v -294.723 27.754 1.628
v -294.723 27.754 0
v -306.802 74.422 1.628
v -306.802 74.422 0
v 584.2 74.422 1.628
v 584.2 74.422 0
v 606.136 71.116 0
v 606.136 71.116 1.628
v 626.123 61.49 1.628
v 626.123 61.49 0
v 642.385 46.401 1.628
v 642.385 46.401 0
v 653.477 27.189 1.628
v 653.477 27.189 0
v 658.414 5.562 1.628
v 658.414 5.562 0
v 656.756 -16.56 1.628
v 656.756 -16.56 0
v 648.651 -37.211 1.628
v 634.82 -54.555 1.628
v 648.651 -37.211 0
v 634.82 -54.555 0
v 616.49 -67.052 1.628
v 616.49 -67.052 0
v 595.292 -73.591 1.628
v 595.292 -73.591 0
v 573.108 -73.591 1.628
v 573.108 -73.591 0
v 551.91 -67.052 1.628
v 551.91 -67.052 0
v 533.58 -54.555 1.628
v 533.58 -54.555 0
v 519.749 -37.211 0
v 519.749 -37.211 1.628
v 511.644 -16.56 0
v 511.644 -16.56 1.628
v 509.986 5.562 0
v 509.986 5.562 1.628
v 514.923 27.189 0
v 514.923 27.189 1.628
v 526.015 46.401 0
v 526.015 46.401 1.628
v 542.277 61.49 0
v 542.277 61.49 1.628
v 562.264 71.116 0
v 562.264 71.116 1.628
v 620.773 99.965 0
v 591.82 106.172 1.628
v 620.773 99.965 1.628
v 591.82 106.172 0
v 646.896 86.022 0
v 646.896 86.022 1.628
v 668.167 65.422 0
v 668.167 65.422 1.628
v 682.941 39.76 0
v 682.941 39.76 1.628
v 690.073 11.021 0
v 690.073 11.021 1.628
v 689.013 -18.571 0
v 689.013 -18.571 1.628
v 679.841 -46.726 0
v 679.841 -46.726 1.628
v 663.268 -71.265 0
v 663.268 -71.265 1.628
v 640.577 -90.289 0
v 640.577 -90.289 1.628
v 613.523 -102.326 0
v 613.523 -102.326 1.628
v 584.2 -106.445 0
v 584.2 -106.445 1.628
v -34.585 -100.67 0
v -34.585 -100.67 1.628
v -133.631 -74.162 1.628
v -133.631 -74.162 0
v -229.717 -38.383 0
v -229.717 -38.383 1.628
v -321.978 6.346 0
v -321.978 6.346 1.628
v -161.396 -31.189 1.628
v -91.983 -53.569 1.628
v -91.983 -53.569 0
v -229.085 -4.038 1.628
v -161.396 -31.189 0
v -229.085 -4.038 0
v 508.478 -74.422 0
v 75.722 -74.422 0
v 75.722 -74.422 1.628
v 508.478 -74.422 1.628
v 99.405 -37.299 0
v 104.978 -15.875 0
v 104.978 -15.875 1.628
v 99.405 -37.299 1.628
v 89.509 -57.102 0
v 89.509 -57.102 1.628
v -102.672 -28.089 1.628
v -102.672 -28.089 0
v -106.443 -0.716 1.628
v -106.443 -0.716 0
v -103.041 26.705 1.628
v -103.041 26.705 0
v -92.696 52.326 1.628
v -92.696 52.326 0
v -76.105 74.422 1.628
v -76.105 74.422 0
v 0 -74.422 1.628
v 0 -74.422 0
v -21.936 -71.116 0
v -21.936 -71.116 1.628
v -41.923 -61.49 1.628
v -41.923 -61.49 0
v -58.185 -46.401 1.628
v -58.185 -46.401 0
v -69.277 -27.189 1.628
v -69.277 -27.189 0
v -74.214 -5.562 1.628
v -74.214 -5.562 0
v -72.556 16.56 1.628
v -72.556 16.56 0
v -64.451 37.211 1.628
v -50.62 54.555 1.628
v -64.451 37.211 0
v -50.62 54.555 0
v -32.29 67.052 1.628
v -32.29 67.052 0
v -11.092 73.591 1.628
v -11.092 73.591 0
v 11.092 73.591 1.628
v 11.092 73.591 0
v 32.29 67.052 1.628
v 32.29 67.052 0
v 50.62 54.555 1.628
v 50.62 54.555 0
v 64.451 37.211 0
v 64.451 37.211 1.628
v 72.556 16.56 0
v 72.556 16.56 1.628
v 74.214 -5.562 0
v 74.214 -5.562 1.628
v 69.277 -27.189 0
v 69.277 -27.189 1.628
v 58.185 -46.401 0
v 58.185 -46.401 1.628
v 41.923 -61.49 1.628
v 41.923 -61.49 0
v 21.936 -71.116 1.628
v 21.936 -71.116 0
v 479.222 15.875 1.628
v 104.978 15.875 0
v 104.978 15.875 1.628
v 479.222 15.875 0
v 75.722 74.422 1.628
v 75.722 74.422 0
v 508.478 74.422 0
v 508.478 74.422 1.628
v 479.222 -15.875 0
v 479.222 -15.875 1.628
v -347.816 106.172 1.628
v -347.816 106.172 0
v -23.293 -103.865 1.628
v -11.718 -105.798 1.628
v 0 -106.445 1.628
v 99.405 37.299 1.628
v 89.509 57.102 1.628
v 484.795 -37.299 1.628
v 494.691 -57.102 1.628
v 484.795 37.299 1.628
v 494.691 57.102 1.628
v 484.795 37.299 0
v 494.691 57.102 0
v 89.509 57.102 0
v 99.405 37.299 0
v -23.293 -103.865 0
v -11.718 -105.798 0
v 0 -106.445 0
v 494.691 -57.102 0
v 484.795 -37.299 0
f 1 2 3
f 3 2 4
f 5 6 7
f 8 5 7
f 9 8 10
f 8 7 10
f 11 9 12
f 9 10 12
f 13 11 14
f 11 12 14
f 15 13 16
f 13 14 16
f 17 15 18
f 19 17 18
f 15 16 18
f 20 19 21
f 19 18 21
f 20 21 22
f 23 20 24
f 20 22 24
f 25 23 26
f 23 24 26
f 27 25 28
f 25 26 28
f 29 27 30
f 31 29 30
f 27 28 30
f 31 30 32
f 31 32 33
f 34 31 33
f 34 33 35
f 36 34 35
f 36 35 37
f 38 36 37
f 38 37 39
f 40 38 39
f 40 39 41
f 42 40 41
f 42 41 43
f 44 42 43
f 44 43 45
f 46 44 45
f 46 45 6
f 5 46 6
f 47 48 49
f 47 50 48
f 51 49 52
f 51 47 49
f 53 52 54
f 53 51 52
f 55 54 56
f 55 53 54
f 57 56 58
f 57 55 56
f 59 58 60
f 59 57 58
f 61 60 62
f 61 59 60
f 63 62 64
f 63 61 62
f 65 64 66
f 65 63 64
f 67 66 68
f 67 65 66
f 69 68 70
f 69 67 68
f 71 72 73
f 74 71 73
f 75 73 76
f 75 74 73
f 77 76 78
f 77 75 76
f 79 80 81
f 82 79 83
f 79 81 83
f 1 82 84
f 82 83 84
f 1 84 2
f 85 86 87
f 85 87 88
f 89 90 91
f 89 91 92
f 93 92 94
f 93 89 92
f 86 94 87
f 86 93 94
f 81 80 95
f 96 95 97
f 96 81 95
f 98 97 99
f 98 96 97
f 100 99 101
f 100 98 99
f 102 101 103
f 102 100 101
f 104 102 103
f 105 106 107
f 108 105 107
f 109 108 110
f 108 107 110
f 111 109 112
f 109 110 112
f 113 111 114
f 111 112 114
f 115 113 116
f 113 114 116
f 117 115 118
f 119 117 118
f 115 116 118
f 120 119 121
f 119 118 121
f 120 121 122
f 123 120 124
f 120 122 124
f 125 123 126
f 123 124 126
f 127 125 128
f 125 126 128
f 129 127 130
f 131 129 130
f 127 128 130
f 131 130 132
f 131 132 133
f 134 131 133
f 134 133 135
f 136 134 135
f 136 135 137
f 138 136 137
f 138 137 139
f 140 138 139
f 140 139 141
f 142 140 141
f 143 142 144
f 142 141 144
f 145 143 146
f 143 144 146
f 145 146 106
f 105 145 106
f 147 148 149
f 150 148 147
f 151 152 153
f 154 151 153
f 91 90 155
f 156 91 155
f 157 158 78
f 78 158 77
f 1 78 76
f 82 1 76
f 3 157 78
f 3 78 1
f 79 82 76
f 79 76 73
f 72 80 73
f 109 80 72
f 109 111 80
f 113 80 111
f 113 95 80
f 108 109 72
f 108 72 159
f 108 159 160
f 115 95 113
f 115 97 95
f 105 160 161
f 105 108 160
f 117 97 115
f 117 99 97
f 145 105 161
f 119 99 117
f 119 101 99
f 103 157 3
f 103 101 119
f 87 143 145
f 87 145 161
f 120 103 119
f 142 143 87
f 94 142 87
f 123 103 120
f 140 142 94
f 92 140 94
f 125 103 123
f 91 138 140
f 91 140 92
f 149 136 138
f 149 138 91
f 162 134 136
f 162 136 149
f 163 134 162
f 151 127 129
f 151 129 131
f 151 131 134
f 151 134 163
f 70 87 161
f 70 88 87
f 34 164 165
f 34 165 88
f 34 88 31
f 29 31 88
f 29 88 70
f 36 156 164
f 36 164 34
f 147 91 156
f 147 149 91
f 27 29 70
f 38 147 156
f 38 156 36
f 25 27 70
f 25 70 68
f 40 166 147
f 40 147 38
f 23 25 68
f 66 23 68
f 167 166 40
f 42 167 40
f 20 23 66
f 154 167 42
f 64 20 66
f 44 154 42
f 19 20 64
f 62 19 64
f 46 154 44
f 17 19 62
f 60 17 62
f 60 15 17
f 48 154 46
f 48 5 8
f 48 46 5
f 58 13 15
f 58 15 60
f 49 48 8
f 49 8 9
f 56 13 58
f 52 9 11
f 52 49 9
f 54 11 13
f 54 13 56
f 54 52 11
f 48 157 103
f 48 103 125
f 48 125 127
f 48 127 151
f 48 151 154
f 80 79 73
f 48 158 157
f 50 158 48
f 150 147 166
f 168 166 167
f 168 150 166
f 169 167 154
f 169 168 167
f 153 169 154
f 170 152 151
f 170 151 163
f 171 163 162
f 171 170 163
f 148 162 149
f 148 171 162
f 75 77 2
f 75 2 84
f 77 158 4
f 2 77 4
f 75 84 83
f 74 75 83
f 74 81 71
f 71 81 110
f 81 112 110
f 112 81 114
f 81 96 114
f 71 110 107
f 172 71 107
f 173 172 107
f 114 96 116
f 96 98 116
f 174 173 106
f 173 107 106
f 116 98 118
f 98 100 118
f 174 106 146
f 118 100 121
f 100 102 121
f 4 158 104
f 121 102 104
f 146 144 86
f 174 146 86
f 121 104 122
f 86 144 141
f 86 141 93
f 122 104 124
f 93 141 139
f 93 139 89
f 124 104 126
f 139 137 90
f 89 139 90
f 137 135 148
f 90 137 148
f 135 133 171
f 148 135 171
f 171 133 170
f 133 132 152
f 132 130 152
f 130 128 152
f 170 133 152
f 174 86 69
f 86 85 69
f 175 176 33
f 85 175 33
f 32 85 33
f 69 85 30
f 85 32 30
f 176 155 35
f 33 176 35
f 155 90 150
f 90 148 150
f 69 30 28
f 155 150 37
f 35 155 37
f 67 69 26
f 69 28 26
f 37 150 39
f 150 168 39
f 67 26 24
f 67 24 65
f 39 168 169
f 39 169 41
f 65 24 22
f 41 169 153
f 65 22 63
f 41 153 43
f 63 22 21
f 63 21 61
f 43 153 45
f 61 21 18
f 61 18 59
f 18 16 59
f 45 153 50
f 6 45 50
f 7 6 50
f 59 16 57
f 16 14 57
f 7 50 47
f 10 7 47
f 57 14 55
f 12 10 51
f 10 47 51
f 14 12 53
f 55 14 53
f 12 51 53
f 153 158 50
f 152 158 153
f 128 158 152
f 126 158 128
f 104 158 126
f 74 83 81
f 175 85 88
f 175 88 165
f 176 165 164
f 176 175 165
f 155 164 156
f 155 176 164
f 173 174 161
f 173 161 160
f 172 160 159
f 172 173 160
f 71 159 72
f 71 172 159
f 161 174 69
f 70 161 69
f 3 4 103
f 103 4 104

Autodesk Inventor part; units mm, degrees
ref_plane "YZ Plane" through (0, 0, 0) normal (1, 0, 0) x (0, 1, 0)
ref_plane "XZ Plane" through (0, 0, 0) normal (0, 1, 0) x (-1, 0, 0)
ref_plane "XY Plane" through (0, 0, 0) normal (0, 0, 1) x (1, 0, 0)
sketch "Fender Base" plane through (0, 0, 0) normal (0, 0, 1) x (1, 0, 0)
  line L0 (-7.62, 106.172) -> (7.62, 106.172) construction
  line L1 (111.252, 7.62) -> (111.252, -7.62)
  line L2 (576.58, 106.172) -> (591.82, 106.172) construction
  line L3 (692.912, 7.62) -> (692.912, -7.62) construction
  line L4 (-7.62, 106.172) -> (591.82, 106.172)
  arc A0 (528.4894, 74.422) -> (584.2, 92.964) centre (584.2, 0) ccw construction
  circle A1 centre (0, 0) radius 92.964 construction
  arc A2 (584.2, -106.4451) -> (591.82, 106.172) centre (584.2, 0) ccw
  line L5 (584.2, 0) -> (584.2, -74.422) construction
  line L6 (0, 0) -> (0, -106.4451) construction
  line L7 (0, -106.4451) -> (584.2, -106.4451)
  line L8 (0, 92.964) -> (584.2, 92.964) construction
  line L9 (0, -92.964) -> (584.2, -92.964) construction
  line L10 (75.7223, 74.422) -> (508.4777, 74.422)
  line L11 (0, 0) -> (584.2, 0) construction
  line L12 (75.7223, -74.422) -> (508.4777, -74.422)
  arc A3 (0, -74.422) -> (0, 74.422) centre (0, 0) ccw
  arc A4 (509.778, 0) -> (584.2, -74.422) centre (584.2, 0) ccw
  arc A5 (0, 74.422) -> (0, -74.422) centre (0, 0) ccw
  line L13 (584.2, -74.422) -> (584.2, -106.4451) construction
  arc A6 (584.2, 74.422) -> (509.778, 0) centre (584.2, 0) ccw
  arc A7 (584.2, -74.422) -> (584.2, 74.422) centre (584.2, 0) ccw
  arc A8 (479.2215, -15.875) -> (508.4777, -74.422) centre (584.2, 0) ccw
  arc A9 (508.4777, 74.422) -> (479.2215, 15.875) centre (584.2, 0) ccw
  arc A10 (584.2, 92.964) -> (528.4894, 74.422) centre (584.2, 0) ccw construction
  line L14 (104.9785, 15.875) -> (479.2215, 15.875)
  line L15 (104.9785, -15.875) -> (479.2215, -15.875)
  arc A11 (75.7223, -74.422) -> (104.9785, -15.875) centre (0, 0) ccw
  arc A12 (104.9785, 15.875) -> (75.7223, 74.422) centre (0, 0) ccw
  line L16 (111.252, 7.62) -> (111.252, -7.62) construction
  circle A13 centre (0, 0) radius 78.74 construction
  circle A14 centre (-433.085, 76.2) radius 38.1 construction
  circle A15 centre (0, 0) radius 439.7375 construction
  circle A16 centre (-306.5807, 82.55) radius 3.175 construction
  arc A17 (-317.4589, 5.1115) -> (-308.6545, 74.422) centre (0, 0) ccw construction
  line L17 (-429.979, 114.1732) -> (6.4191, 78.4779) construction
  line L18 (-443.1268, 39.4471) -> (-20.753, -75.9559) construction
  line L19 (-7.62, 106.172) -> (-347.8163, 106.172)
  line L20 (-347.8163, 155.9143) -> (-347.8163, -18.2544) construction
  arc A18 (-321.9776, 6.3462) -> (-34.5848, -100.67) centre (194.8237, 954.8143) ccw
  line L21 (-347.8163, 106.172) -> (-321.9776, 6.3462)
  line L22 (-283.1615, -143.6169) -> (-252.5039, -262.0603)
  arc A19 (-294.7226, 27.7545) -> (-91.9832, -53.5691) centre (194.8237, 954.8143) ccw
  line L23 (-294.7226, 27.7545) -> (-306.8019, 74.422)
  line L24 (-306.8019, 74.422) -> (-76.1047, 74.422)
  arc A20 (-76.1047, 74.422) -> (-91.9832, -53.5691) centre (0, 0) ccw
  arc A21 (-34.5848, -100.67) -> (0, -106.4451) centre (0, 0) ccw
  point P0 (0, 106.172)
  point P1 (111.252, 0)
  point P2 (584.2, 106.172)
  point P3 (692.912, 0)
  dimension "d100" = 879.475
  dimension "d0" = 15.24
  dimension "d1" = 106.172
  dimension "d2" = 15.24
  dimension "d3" = 111.252
  dimension "d4" = 15.24
  dimension "d5" = 106.172
  dimension "d6" = 584.2
  dimension "d7" = 15.24
  dimension "d8" = 108.712
  dimension "d9" = 584.2
  dimension "d10" = 185.928
  dimension "d11" = 185.928
  dimension "d13" = 584.2
  dimension "d14" = 31.75
  dimension "d66" = 31.75
  dimension "d96" = 157.48
  dimension "d97" = 76.2
  dimension "d99" = 76.2
  dimension "d101" = 6.35
  dimension "d102" = 82.55
  dimension "d103" = 635
  dimension "d106" = 31.75
extrude "Plate1" add sketch "Fender Base" along normal blind 1.6281 contours L4 A2 L7 A21 A18 L21 L19 | L10 A9 L14 A12 | A5 A3 | A6 A7 A4 | L23 L24 A20 A19
sketch "Oval Pattern" plane through (0, 0, 1.6281) normal (0, 0, 1) x (1, 0, 0)
  circle A0 centre (-25.6073, 82.042) radius 6.35
  arc A1 (-14.4463, 83.0479) -> (-28.9236, 92.7462) centre (-25.6073, 82.042) ccw
  arc A2 (12.2648, 98.9975) -> (-28.9236, 92.7462) centre (-1.2605, 49.2962) ccw
  arc A3 (12.2648, 98.9975) -> (-14.4463, 83.0479) centre (17.7837, 59.4132) ccw
  circle A4 centre (-61.4767, 60.0603) radius 6.35
  arc A5 (-52.1303, 66.2426) -> (-69.4759, 67.9082) centre (-61.4767, 60.0603) ccw
  arc A6 (-36.1888, 92.9586) -> (-69.4759, 67.9082) centre (-24.5055, 42.7924) ccw
  arc A7 (-36.1888, 92.9586) -> (-52.1303, 66.2426) centre (-12.5443, 60.7357) ccw
  circle A8 centre (-82.6165, 23.6883) radius 6.35
  arc A9 (-77.3239, 33.5658) -> (-93.3821, 26.7996) centre (-82.6165, 23.6883) ccw
  arc A10 (-75.9716, 64.6471) -> (-93.3821, 26.7996) centre (-41.879, 26.0356) ccw
  arc A11 (-75.9716, 64.6471) -> (-77.3239, 33.5658) centre (-39.8667, 47.5062) ccw
  circle A12 centre (-83.9616, -18.3594) radius 6.35
  arc A13 (-83.991, -7.1533) -> (-94.9141, -20.7301) centre (-83.9616, -18.3594) ccw
  arc A14 (-97.5518, 20.8463) -> (-94.9141, -20.7301) centre (-49.2185, 3.0408) ccw
  arc A15 (-97.5518, 20.8463) -> (-83.991, -7.1533) centre (-57.6371, 22.8943) ccw
  circle A16 centre (-65.1898, -56.0082) radius 6.35
  arc A17 (-70.534, -46.1585) -> (-73.705, -63.293) centre (-65.1898, -56.0082) ccw
  arc A18 (-95.7589, -27.9492) -> (-73.705, -63.293) centre (-44.7653, -20.6826) ccw
  arc A19 (-95.7589, -27.9492) -> (-70.534, -46.1585) centre (-61.5979, -7.2031) ccw
  circle A20 centre (-30.7986, -80.2376) radius 6.35
  arc A21 (-40.1773, -74.1042) -> (-34.8364, -90.691) centre (-30.7986, -80.2376) ccw
  arc A22 (-71.0224, -70.0481) -> (-34.8364, -90.691) centre (-29.5865, -39.4505) ccw
  arc A23 (-71.0224, -70.0481) -> (-40.1773, -74.1042) centre (-50.8, -35.5745) ccw
  circle A24 centre (10.9718, -85.2423) radius 6.35
  arc A25 (-0.1943, -84.2948) -> (12.3789, -96.3597) centre (10.9718, -85.2423) ccw
  arc A26 (-29.2692, -95.3637) -> (12.3789, -96.3597) centre (-7.3189, -48.7662) ccw
  arc A27 (-29.2692, -95.3637) -> (-0.1943, -84.2948) centre (-27.8305, -55.4225) ccw
  line L0 (-347.8163, 106.172) -> (591.82, 106.172) projected
  circle A28 centre (19.9908, 83.9489) radius 6.35
  arc A29 (31.1517, 84.9548) -> (16.6745, 94.6531) centre (19.9908, 83.9489) ccw
  arc A30 (57.8628, 100.9043) -> (16.6745, 94.6531) centre (44.3376, 51.2031) ccw
  arc A31 (57.8628, 100.9043) -> (31.1517, 84.9548) centre (63.3817, 61.32) ccw
  circle A32 centre (65.7108, 83.9489) radius 6.35
  arc A33 (76.8717, 84.9548) -> (62.3945, 94.6531) centre (65.7108, 83.9489) ccw
  arc A34 (103.5828, 100.9043) -> (76.8717, 84.9548) centre (109.1017, 61.32) ccw
  arc A35 (103.5828, 100.9043) -> (62.3945, 94.6531) centre (90.0576, 51.2031) ccw
  circle A36 centre (111.4308, 83.9489) radius 6.35
  arc A37 (122.5917, 84.9548) -> (108.1145, 94.6531) centre (111.4308, 83.9489) ccw
  arc A38 (149.3028, 100.9043) -> (122.5917, 84.9548) centre (154.8217, 61.32) ccw
  arc A39 (149.3028, 100.9043) -> (108.1145, 94.6531) centre (135.7776, 51.2031) ccw
  circle A40 centre (157.1508, 83.9489) radius 6.35
  arc A41 (168.3117, 84.9548) -> (153.8345, 94.6531) centre (157.1508, 83.9489) ccw
  arc A42 (195.0228, 100.9043) -> (168.3117, 84.9548) centre (200.5417, 61.32) ccw
  arc A43 (195.0228, 100.9043) -> (153.8345, 94.6531) centre (181.4976, 51.2031) ccw
  circle A44 centre (202.8708, 83.9489) radius 6.35
  arc A45 (214.0317, 84.9548) -> (199.5545, 94.6531) centre (202.8708, 83.9489) ccw
  arc A46 (240.7428, 100.9043) -> (214.0317, 84.9548) centre (246.2617, 61.32) ccw
  arc A47 (240.7428, 100.9043) -> (199.5545, 94.6531) centre (227.2176, 51.2031) ccw
  circle A48 centre (248.5908, 83.9489) radius 6.35
  arc A49 (259.7517, 84.9548) -> (245.2745, 94.6531) centre (248.5908, 83.9489) ccw
  arc A50 (286.4628, 100.9043) -> (259.7517, 84.9548) centre (291.9817, 61.32) ccw
  arc A51 (286.4628, 100.9043) -> (245.2745, 94.6531) centre (272.9376, 51.2031) ccw
  circle A52 centre (294.3108, 83.9489) radius 6.35
  arc A53 (305.4717, 84.9548) -> (290.9945, 94.6531) centre (294.3108, 83.9489) ccw
  arc A54 (332.1828, 100.9043) -> (305.4717, 84.9548) centre (337.7017, 61.32) ccw
  arc A55 (332.1828, 100.9043) -> (290.9945, 94.6531) centre (318.6576, 51.2031) ccw
  circle A56 centre (340.0308, 83.9489) radius 6.35
  arc A57 (351.1917, 84.9548) -> (336.7145, 94.6531) centre (340.0308, 83.9489) ccw
  arc A58 (377.9028, 100.9043) -> (351.1917, 84.9548) centre (383.4217, 61.32) ccw
  arc A59 (377.9028, 100.9043) -> (336.7145, 94.6531) centre (364.3776, 51.2031) ccw
  circle A60 centre (385.7508, 83.9489) radius 6.35
  arc A61 (396.9117, 84.9548) -> (382.4345, 94.6531) centre (385.7508, 83.9489) ccw
  arc A62 (423.6228, 100.9043) -> (396.9117, 84.9548) centre (429.1417, 61.32) ccw
  arc A63 (423.6228, 100.9043) -> (382.4345, 94.6531) centre (410.0976, 51.2031) ccw
  circle A64 centre (431.4708, 83.9489) radius 6.35
  arc A65 (442.6317, 84.9548) -> (428.1545, 94.6531) centre (431.4708, 83.9489) ccw
  arc A66 (469.3428, 100.9043) -> (442.6317, 84.9548) centre (474.8617, 61.32) ccw
  arc A67 (469.3428, 100.9043) -> (428.1545, 94.6531) centre (455.8176, 51.2031) ccw
  circle A68 centre (477.1908, 83.9489) radius 6.35
  arc A69 (488.3517, 84.9548) -> (473.8745, 94.6531) centre (477.1908, 83.9489) ccw
  arc A70 (515.0628, 100.9043) -> (488.3517, 84.9548) centre (520.5817, 61.32) ccw
  arc A71 (515.0628, 100.9043) -> (473.8745, 94.6531) centre (501.5376, 51.2031) ccw
  circle A72 centre (522.9108, 83.9489) radius 6.35
  arc A73 (534.0717, 84.9548) -> (519.5945, 94.6531) centre (522.9108, 83.9489) ccw
  arc A74 (560.7828, 100.9043) -> (534.0717, 84.9548) centre (566.3017, 61.32) ccw
  arc A75 (560.7828, 100.9043) -> (519.5945, 94.6531) centre (547.2576, 51.2031) ccw
  circle A76 centre (568.6308, 83.9489) radius 6.35
  arc A77 (579.7917, 84.9548) -> (565.3145, 94.6531) centre (568.6308, 83.9489) ccw
  arc A78 (606.5028, 100.9043) -> (579.7917, 84.9548) centre (612.0217, 61.32) ccw
  arc A79 (606.5028, 100.9043) -> (565.3145, 94.6531) centre (592.9776, 51.2031) ccw
  line L1 (75.7223, 74.422) -> (508.4777, 74.422) projected
  circle A80 centre (612.6911, 80.4865) radius 6.35
  arc A81 (622.8597, 75.7771) -> (615.1712, 91.4147) centre (612.6911, 80.4865) ccw
  arc A82 (653.967, 76.2343) -> (615.1712, 91.4147) centre (617.4031, 39.9544) ccw
  arc A83 (653.967, 76.2343) -> (622.8597, 75.7771) centre (638.9544, 39.1938) ccw
  circle A84 centre (649.1172, 55.4578) radius 6.35
  arc A85 (655.5688, 46.2951) -> (656.7292, 63.6819) centre (649.1172, 55.4578) ccw
  arc A86 (682.7371, 31.1374) -> (656.7292, 63.6819) centre (632.9319, 17.9999) ccw
  arc A87 (682.7371, 31.1374) -> (655.5688, 46.2951) centre (651.2156, 6.5657) ccw
  circle A88 centre (668.1489, 15.5692) radius 6.35
  arc A89 (669.1548, 4.4083) -> (678.8531, 18.8855) centre (668.1489, 15.5692) ccw
  arc A90 (685.1043, -22.3028) -> (678.8531, 18.8855) centre (635.4031, -8.7776) ccw
  arc A91 (685.1043, -22.3028) -> (669.1548, 4.4083) centre (645.52, -27.8217) ccw
  circle A92 centre (664.6865, -28.4911) radius 6.35
  arc A93 (659.9771, -38.6597) -> (675.6147, -30.9712) centre (664.6865, -28.4911) ccw
  arc A94 (660.4343, -69.767) -> (675.6147, -30.9712) centre (624.1544, -33.2031) ccw
  arc A95 (660.4343, -69.767) -> (659.9771, -38.6597) centre (623.3938, -54.7544) ccw
  circle A96 centre (639.6578, -64.9172) radius 6.35
  arc A97 (630.4951, -71.3688) -> (647.8819, -72.5292) centre (639.6578, -64.9172) ccw
  arc A98 (615.3374, -98.5371) -> (647.8819, -72.5292) centre (602.1999, -48.7319) ccw
  arc A99 (615.3374, -98.5371) -> (630.4951, -71.3688) centre (590.7657, -67.0156) ccw
  circle A100 centre (599.7692, -83.9489) radius 6.35
  arc A101 (588.6083, -84.9548) -> (603.0855, -94.6531) centre (599.7692, -83.9489) ccw
  arc A102 (561.8972, -100.9043) -> (603.0855, -94.6531) centre (575.4224, -51.2031) ccw
  arc A103 (561.8972, -100.9043) -> (588.6083, -84.9548) centre (556.3783, -61.32) ccw
  line L2 (584.2, -106.4451) -> (0, -106.4451) projected
  circle A104 centre (60.5018, -85.2423) radius 6.35
  arc A105 (49.3357, -84.2948) -> (61.9089, -96.3597) centre (60.5018, -85.2423) ccw
  arc A106 (20.2608, -95.3637) -> (49.3357, -84.2948) centre (21.6995, -55.4225) ccw
  arc A107 (20.2608, -95.3637) -> (61.9089, -96.3597) centre (42.2111, -48.7662) ccw
  circle A108 centre (110.0318, -85.2423) radius 6.35
  arc A109 (98.8657, -84.2948) -> (111.4389, -96.3597) centre (110.0318, -85.2423) ccw
  arc A110 (69.7908, -95.3637) -> (98.8657, -84.2948) centre (71.2295, -55.4225) ccw
  arc A111 (69.7908, -95.3637) -> (111.4389, -96.3597) centre (91.7411, -48.7662) ccw
  circle A112 centre (159.5618, -85.2423) radius 6.35
  arc A113 (148.3957, -84.2948) -> (160.9689, -96.3597) centre (159.5618, -85.2423) ccw
  arc A114 (119.3208, -95.3637) -> (148.3957, -84.2948) centre (120.7595, -55.4225) ccw
  arc A115 (119.3208, -95.3637) -> (160.9689, -96.3597) centre (141.2711, -48.7662) ccw
  circle A116 centre (209.0918, -85.2423) radius 6.35
  arc A117 (197.9257, -84.2948) -> (210.4989, -96.3597) centre (209.0918, -85.2423) ccw
  arc A118 (168.8508, -95.3637) -> (197.9257, -84.2948) centre (170.2895, -55.4225) ccw
  arc A119 (168.8508, -95.3637) -> (210.4989, -96.3597) centre (190.8011, -48.7662) ccw
  circle A120 centre (258.6218, -85.2423) radius 6.35
  arc A121 (247.4557, -84.2948) -> (260.0289, -96.3597) centre (258.6218, -85.2423) ccw
  arc A122 (218.3808, -95.3637) -> (247.4557, -84.2948) centre (219.8195, -55.4225) ccw
  arc A123 (218.3808, -95.3637) -> (260.0289, -96.3597) centre (240.3311, -48.7662) ccw
  circle A124 centre (308.1518, -85.2423) radius 6.35
  arc A125 (296.9857, -84.2948) -> (309.5589, -96.3597) centre (308.1518, -85.2423) ccw
  arc A126 (267.9108, -95.3637) -> (296.9857, -84.2948) centre (269.3495, -55.4225) ccw
  arc A127 (267.9108, -95.3637) -> (309.5589, -96.3597) centre (289.8611, -48.7662) ccw
  circle A128 centre (357.6818, -85.2423) radius 6.35
  arc A129 (346.5157, -84.2948) -> (359.0889, -96.3597) centre (357.6818, -85.2423) ccw
  arc A130 (317.4408, -95.3637) -> (346.5157, -84.2948) centre (318.8795, -55.4225) ccw
  arc A131 (317.4408, -95.3637) -> (359.0889, -96.3597) centre (339.3911, -48.7662) ccw
  circle A132 centre (407.2118, -85.2423) radius 6.35
  arc A133 (396.0457, -84.2948) -> (408.6189, -96.3597) centre (407.2118, -85.2423) ccw
  arc A134 (366.9708, -95.3637) -> (396.0457, -84.2948) centre (368.4095, -55.4225) ccw
  arc A135 (366.9708, -95.3637) -> (408.6189, -96.3597) centre (388.9211, -48.7662) ccw
  circle A136 centre (456.7418, -85.2423) radius 6.35
  arc A137 (445.5757, -84.2948) -> (458.1489, -96.3597) centre (456.7418, -85.2423) ccw
  arc A138 (416.5008, -95.3637) -> (445.5757, -84.2948) centre (417.9395, -55.4225) ccw
  arc A139 (416.5008, -95.3637) -> (458.1489, -96.3597) centre (438.4511, -48.7662) ccw
  circle A140 centre (506.2718, -85.2423) radius 6.35
  arc A141 (495.1057, -84.2948) -> (507.6789, -96.3597) centre (506.2718, -85.2423) ccw
  arc A142 (466.0308, -95.3637) -> (495.1057, -84.2948) centre (467.4695, -55.4225) ccw
  arc A143 (466.0308, -95.3637) -> (507.6789, -96.3597) centre (487.9811, -48.7662) ccw
  circle A144 centre (555.8018, -85.2423) radius 6.35
  arc A145 (544.6357, -84.2948) -> (557.2089, -96.3597) centre (555.8018, -85.2423) ccw
  arc A146 (515.5608, -95.3637) -> (544.6357, -84.2948) centre (516.9995, -55.4225) ccw
  arc A147 (515.5608, -95.3637) -> (557.2089, -96.3597) centre (537.5111, -48.7662) ccw
  line L3 (104.9785, 15.875) -> (479.2215, 15.875) projected
  arc A148 (104.9785, 15.875) -> (75.7223, 74.422) centre (0, 0) ccw projected
  arc A149 (508.4777, 74.422) -> (479.2215, 15.875) centre (584.2, 0) ccw projected
  circle A150 centre (430.2676, 0) radius 8.89
  line L4 (0, 0) -> (584.2, 0) construction
  line L5 (430.2676, 8.89) -> (430.2676, -8.89) construction
  arc A151 (423.8766, 11.8482) -> (423.8766, -11.8482) centre (430.2676, 0) ccw
  arc A152 (436.6586, -11.8482) -> (436.6586, 11.8482) centre (430.2676, 0) ccw
  arc A153 (423.8766, 11.8482) -> (389.1564, 0) centre (441.3857, -96.257) ccw
  arc A154 (389.1564, 0) -> (423.8766, -11.8482) centre (441.3857, 96.257) ccw
  arc A155 (471.3788, 0) -> (436.6586, 11.8482) centre (419.1495, -96.257) ccw
  arc A156 (436.6586, -11.8482) -> (471.3788, 0) centre (419.1495, 96.257) ccw
  arc A157 (584.2, 74.422) -> (509.778, 0) centre (584.2, 0) ccw projected
  arc A158 (509.778, 0) -> (584.2, -74.422) centre (584.2, 0) ccw projected
  arc A159 (0, 74.422) -> (0, -74.422) centre (0, 0) ccw projected
  arc A160 (0, -74.422) -> (0, 74.422) centre (0, 0) ccw projected
  arc A161 (75.7223, -74.422) -> (104.9785, -15.875) centre (0, 0) ccw construction
  arc A162 (300.2564, 0) -> (334.9766, -11.8482) centre (352.4857, 96.257) ccw
  arc A163 (334.9766, 11.8482) -> (300.2564, 0) centre (352.4857, -96.257) ccw
  arc A164 (334.9766, 11.8482) -> (334.9766, -11.8482) centre (341.3676, 0) ccw
  line L6 (341.3676, 8.89) -> (341.3676, -8.89) construction
  circle A165 centre (341.3676, 0) radius 8.89
  arc A166 (347.7586, -11.8482) -> (347.7586, 11.8482) centre (341.3676, 0) ccw
  arc A167 (382.4788, 0) -> (347.7586, 11.8482) centre (330.2495, -96.257) ccw
  arc A168 (347.7586, -11.8482) -> (382.4788, 0) centre (330.2495, 96.257) ccw
  arc A169 (211.3564, 0) -> (246.0766, -11.8482) centre (263.5857, 96.257) ccw
  arc A170 (246.0766, 11.8482) -> (211.3564, 0) centre (263.5857, -96.257) ccw
  arc A171 (246.0766, 11.8482) -> (246.0766, -11.8482) centre (252.4676, 0) ccw
  line L7 (252.4676, 8.89) -> (252.4676, -8.89) construction
  circle A172 centre (252.4676, 0) radius 8.89
  arc A173 (258.8586, -11.8482) -> (258.8586, 11.8482) centre (252.4676, 0) ccw
  arc A174 (293.5788, 0) -> (258.8586, 11.8482) centre (241.3495, -96.257) ccw
  arc A175 (258.8586, -11.8482) -> (293.5788, 0) centre (241.3495, 96.257) ccw
  arc A176 (122.4564, 0) -> (157.1766, -11.8482) centre (174.6857, 96.257) ccw
  arc A177 (157.1766, 11.8482) -> (122.4564, 0) centre (174.6857, -96.257) ccw
  arc A178 (157.1766, 11.8482) -> (157.1766, -11.8482) centre (163.5676, 0) ccw
  line L8 (163.5676, 8.89) -> (163.5676, -8.89) construction
  circle A179 centre (163.5676, 0) radius 8.89
  arc A180 (169.9586, -11.8482) -> (169.9586, 11.8482) centre (163.5676, 0) ccw
  arc A181 (204.6788, 0) -> (169.9586, 11.8482) centre (152.4495, -96.257) ccw
  arc A182 (169.9586, -11.8482) -> (204.6788, 0) centre (152.4495, 96.257) ccw
  line L9 (88.6116, 11.43) -> (116.3818, 11.43)
  line L10 (116.3818, 11.43) -> (116.3818, -11.43)
  line L11 (116.3818, -11.43) -> (88.6116, -11.43)
  line L12 (88.6116, -11.43) -> (88.6116, 11.43)
  line L13 (110.6883, 7.3883) -> (110.6883, -7.6711) construction
  point P0 (-7.62, 106.172)
  point P1 (9.4092, 94.8654)
  point P2 (614.3723, 99.0943)
  point P3 (659.8771, 70.7321)
  point P4 (685.1043, 23.4172)
  point P5 (683.2943, -30.1723)
  point P6 (654.9321, -75.6771)
  point P7 (607.6172, -100.9043)
  point P8 (116.3818, 0)
  dimension "d38" = 170
  dimension "d44" = 45.72
  dimension "d51" = 180
  dimension "d55" = 49.53
  dimension "d69" = 17.78
  dimension "d87" = 88.9
  dimension "d92" = 22.86
  dimension "d94" = 5.6935
extrude "Cut1" cut sketch "Fender Base" along normal through all contours A5 A3
extrude "Cut2" cut sketch "Fender Base" along normal through all contours A6 A7 A4
extrude "Cut3" cut sketch "Fender Base" along normal through all contours L10 A9 L14 A12
extrude "Cut4" cut sketch "Fender Base" along normal through all contours L23 L24 A20 A19
equation "\"d11\" = d10"
equation "\"d62\" = Thickness"
equation "\"d64\" = Thickness"
equation "\"d67\" = Thickness"
equation "\"BendRadius\" = Thickness"
equation "\"BendReliefWidth\" = Thickness"
equation "\"BendReliefDepth\" = 0.5 * Thickness"
equation "\"CornerReliefSize\" = 4 * Thickness"
equation "\"MinimumRemnant\" = 2 * Thickness"
equation "\"TransitionRadius\" = BendRadius"
equation "\"JacobiRadiusSize\" = Thickness"
equation "\"GapSize\" = Thickness"
equation "\"d23\" = BendRadius"
equation "\"Thickness\" = 1.62814"
properties part number "TG2" material "Aluminum 6061"
